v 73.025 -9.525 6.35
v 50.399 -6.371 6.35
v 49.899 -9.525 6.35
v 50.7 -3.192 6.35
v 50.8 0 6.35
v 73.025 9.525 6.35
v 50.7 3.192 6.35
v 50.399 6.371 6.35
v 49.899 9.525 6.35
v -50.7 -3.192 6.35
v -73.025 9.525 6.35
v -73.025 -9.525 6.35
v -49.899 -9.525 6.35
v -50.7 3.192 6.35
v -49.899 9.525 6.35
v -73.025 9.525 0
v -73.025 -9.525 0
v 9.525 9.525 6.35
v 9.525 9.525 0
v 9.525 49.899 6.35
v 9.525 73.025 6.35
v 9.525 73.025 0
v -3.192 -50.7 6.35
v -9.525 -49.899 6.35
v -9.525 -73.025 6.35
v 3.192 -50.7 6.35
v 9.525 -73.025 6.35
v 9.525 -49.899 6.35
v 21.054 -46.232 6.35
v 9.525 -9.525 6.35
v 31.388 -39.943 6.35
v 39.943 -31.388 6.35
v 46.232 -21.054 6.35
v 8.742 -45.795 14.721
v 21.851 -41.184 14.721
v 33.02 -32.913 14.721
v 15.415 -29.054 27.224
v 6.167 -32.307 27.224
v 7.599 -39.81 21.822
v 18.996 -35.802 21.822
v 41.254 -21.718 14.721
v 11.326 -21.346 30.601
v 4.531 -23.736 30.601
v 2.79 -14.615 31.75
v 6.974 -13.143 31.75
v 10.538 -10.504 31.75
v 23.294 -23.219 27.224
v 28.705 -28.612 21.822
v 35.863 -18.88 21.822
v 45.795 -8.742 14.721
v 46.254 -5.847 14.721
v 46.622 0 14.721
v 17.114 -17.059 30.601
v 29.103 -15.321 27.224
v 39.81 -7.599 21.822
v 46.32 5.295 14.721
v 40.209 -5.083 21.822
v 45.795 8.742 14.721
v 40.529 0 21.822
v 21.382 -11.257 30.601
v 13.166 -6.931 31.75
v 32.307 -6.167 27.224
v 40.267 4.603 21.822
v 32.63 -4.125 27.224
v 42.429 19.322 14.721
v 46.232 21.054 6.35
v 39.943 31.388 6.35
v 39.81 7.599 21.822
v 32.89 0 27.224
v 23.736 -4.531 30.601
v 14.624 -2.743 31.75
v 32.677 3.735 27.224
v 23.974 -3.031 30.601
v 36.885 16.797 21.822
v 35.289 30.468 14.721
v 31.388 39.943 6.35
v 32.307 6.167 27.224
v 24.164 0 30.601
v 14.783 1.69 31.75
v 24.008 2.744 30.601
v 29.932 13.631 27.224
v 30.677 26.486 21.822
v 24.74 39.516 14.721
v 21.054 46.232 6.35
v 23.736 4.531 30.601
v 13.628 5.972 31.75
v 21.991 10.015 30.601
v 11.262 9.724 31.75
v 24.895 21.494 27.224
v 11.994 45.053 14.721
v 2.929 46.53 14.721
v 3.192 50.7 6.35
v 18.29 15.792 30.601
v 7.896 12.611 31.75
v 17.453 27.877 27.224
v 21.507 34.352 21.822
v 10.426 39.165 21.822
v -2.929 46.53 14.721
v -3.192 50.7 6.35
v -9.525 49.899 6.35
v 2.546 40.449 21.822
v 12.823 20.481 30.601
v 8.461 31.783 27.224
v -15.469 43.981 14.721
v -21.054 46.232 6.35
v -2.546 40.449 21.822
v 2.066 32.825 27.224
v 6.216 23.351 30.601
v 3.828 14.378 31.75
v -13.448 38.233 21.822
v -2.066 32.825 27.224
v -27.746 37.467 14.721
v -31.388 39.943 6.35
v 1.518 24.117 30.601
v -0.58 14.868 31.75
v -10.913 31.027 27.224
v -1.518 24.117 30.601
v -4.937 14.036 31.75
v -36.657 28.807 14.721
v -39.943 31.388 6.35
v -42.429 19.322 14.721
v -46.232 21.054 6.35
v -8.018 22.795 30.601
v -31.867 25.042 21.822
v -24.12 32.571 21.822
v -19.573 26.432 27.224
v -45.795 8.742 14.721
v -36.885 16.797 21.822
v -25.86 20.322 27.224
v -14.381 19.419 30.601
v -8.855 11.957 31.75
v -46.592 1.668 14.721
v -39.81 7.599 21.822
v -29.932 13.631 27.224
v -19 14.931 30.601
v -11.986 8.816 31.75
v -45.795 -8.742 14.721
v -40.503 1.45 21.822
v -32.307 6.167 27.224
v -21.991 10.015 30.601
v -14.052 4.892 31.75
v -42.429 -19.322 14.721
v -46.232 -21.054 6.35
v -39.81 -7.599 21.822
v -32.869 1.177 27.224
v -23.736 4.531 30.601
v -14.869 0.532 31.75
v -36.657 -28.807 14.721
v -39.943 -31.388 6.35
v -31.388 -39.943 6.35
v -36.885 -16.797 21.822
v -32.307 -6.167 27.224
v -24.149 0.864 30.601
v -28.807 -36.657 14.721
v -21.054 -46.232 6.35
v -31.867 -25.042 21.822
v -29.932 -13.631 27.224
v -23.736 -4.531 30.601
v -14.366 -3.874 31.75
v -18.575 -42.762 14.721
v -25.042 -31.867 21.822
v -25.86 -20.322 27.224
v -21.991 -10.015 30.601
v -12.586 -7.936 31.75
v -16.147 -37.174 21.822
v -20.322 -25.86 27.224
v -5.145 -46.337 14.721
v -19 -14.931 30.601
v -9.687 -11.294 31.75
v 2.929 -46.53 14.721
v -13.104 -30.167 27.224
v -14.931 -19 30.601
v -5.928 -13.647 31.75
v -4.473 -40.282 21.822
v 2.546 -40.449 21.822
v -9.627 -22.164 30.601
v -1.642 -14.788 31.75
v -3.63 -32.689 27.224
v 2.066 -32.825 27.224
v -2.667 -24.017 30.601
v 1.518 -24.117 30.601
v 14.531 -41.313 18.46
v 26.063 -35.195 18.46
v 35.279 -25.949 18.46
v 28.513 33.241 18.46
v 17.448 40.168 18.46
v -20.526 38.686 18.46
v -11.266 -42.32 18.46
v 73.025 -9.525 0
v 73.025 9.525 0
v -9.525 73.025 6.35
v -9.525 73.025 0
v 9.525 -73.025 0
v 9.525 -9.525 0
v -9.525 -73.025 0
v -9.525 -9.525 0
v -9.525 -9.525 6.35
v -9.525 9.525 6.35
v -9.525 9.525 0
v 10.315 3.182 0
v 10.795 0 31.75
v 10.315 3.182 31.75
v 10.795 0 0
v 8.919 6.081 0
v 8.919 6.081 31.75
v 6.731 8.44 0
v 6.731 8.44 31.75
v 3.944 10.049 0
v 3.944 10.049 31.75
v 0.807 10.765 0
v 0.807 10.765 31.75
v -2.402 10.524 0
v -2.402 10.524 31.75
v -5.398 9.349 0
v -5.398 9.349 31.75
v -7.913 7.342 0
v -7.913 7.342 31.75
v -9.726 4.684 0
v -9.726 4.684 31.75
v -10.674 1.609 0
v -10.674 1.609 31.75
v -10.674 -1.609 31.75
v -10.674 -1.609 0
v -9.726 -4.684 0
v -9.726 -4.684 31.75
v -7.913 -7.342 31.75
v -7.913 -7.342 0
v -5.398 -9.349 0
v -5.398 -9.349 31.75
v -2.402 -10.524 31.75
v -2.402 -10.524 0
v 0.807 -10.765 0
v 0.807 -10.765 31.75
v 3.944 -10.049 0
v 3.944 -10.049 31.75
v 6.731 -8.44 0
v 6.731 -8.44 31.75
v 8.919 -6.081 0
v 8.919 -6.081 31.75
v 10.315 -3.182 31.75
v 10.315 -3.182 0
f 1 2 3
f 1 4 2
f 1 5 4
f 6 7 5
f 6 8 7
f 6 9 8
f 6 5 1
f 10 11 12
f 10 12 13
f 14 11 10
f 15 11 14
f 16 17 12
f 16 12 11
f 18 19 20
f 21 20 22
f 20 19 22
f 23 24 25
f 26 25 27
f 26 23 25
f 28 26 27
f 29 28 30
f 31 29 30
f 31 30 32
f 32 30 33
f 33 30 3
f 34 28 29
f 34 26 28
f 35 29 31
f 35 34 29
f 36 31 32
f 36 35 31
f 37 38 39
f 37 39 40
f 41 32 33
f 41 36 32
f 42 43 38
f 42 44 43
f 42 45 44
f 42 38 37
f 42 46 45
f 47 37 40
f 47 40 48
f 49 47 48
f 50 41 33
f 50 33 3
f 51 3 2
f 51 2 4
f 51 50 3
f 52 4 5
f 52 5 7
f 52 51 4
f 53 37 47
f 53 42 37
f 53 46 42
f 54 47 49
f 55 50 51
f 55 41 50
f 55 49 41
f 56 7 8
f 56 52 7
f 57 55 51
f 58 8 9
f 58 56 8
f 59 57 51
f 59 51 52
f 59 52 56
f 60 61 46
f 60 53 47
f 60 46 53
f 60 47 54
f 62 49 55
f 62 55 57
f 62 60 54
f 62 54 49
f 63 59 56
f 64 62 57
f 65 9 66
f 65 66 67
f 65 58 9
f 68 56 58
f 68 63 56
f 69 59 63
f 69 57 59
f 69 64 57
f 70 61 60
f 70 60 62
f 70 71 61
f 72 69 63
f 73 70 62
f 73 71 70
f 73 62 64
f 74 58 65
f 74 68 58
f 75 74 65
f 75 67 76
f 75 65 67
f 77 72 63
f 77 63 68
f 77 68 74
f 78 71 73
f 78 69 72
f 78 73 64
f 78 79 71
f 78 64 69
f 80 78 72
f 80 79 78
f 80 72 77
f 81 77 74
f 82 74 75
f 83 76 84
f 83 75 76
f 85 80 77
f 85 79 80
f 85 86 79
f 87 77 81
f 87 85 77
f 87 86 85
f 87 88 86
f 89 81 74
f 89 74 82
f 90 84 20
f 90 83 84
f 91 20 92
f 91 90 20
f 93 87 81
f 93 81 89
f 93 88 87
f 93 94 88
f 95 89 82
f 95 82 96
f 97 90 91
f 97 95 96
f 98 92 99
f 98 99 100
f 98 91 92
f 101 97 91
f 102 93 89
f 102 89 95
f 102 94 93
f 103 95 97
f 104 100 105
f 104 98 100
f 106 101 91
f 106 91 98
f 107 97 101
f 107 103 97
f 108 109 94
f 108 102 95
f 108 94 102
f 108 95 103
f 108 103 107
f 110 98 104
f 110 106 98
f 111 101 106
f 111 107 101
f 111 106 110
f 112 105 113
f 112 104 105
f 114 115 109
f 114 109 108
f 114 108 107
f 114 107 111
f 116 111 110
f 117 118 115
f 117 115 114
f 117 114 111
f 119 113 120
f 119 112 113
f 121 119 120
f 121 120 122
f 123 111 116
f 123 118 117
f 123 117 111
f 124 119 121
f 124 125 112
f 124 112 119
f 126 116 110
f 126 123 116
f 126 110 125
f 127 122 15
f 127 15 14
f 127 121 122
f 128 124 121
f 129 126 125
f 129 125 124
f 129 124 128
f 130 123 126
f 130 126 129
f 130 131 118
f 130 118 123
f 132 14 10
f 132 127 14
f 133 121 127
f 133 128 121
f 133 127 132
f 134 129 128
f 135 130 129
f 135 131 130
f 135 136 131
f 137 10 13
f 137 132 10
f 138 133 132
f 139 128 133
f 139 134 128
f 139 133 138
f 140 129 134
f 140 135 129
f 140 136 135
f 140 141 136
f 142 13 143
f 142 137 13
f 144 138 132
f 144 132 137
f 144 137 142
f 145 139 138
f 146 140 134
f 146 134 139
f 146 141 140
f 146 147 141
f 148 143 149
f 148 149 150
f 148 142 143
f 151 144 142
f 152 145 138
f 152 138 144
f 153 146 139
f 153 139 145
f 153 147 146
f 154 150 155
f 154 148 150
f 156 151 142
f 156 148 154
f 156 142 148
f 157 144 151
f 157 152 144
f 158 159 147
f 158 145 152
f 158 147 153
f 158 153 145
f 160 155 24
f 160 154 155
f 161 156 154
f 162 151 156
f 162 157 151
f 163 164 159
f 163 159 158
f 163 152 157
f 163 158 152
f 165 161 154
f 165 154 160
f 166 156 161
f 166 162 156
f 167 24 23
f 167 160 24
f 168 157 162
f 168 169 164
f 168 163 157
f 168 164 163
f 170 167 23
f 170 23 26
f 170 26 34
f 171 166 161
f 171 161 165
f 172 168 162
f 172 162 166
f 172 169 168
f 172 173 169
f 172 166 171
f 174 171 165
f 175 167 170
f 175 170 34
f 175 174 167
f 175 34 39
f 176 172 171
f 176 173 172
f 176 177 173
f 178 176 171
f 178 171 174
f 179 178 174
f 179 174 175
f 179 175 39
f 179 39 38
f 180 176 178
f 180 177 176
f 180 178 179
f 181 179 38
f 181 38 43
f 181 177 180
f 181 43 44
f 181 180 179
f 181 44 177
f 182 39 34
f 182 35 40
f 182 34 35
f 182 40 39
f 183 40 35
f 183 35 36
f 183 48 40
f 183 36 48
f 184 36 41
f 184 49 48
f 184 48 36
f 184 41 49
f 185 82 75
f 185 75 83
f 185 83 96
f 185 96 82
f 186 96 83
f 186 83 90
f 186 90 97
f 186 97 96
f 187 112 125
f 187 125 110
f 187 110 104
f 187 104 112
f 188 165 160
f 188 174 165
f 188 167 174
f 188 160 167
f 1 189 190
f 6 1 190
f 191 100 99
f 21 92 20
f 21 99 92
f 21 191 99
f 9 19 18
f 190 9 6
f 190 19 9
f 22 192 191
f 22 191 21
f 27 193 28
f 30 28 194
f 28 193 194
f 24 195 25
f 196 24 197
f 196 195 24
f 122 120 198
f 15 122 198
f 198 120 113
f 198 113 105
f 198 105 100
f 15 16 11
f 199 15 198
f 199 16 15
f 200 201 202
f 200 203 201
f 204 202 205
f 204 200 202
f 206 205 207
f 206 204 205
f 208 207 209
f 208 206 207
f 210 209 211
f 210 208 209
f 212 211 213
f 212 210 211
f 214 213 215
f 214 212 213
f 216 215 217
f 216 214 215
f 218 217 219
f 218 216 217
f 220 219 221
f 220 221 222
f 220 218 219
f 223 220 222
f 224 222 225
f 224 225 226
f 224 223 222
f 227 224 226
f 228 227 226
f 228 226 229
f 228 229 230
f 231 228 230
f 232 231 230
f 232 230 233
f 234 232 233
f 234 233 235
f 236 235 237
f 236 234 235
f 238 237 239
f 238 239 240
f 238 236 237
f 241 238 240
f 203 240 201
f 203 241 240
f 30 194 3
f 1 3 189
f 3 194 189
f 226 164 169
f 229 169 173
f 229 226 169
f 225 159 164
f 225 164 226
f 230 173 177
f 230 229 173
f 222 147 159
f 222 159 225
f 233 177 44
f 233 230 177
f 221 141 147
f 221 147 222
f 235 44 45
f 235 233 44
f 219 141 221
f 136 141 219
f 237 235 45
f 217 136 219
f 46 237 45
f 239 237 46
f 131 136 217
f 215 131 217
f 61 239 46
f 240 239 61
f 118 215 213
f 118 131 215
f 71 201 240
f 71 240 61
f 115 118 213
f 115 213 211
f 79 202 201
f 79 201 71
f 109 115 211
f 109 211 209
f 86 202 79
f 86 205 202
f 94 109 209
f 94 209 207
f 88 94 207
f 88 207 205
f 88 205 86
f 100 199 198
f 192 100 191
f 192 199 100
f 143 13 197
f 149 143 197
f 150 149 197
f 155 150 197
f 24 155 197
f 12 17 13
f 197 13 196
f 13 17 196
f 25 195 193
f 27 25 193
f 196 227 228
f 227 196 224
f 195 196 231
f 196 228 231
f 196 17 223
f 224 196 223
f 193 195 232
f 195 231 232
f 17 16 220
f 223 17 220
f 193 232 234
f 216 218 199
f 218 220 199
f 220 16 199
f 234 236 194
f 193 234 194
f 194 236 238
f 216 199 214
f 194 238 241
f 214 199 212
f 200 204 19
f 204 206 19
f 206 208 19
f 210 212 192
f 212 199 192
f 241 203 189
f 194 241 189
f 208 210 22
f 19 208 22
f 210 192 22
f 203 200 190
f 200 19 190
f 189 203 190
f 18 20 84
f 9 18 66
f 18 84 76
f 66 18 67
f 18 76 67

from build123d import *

# Parameters (mm, degrees)
F0_W     = 19.05
F0_H     = 63.5
F0_W_2   = 63.5
F0_H_2   = 19.05
F1_DEPTH = 6.35
F2_R     = 10.795
F3_DEPTH = 25.4
F4_DEPTH = 6.35


# Not quite as in the source:
# - a fillet or chamfer that OpenCascade refuses, or shapes differently, is made with other operations: its cross-section is extruded or revolved along the edge and cut away or added


with BuildPart() as f1:
    # F0 (on Top) → F1 (new body)
    with BuildSketch(Plane.XY):
        with Locations((0, 41.275)):
            Rectangle(F0_W, F0_H)
        with Locations((-41.275, 0)):
            Rectangle(F0_W_2, F0_H_2)
        Rectangle(F0_W, F0_H_2)
        with Locations((41.275, 0)):
            Rectangle(F0_W_2, F0_H_2)
        with Locations((0, -41.275)):
            Rectangle(F0_W, F0_H)
    extrude(amount=F1_DEPTH)

    # F2 (on face) → F3 (join)
    with BuildSketch(Plane.XY.offset(6.35)):
        with BuildLine():
            ThreePointArc((49.8990418245, -9.525), (50.5742588907, -4.7837576923), (50.8, 0))
            ThreePointArc((50.8, 0), (50.5742588907, 4.7837576923), (49.8990418245, 9.525))
            Line((49.8990418245, 9.525), (9.525, 9.525))
            Line((9.525, 9.525), (9.525, 49.8990418245))
            ThreePointArc((9.525, 49.8990418245), (0, 50.8), (-9.525, 49.8990418245))
            Line((-9.525, 49.8990418245), (-9.525, 9.525))
            Line((-9.525, 9.525), (-49.8990418245, 9.525))
            ThreePointArc((-49.8990418245, 9.525), (-50.8, 0), (-49.8990418245, -9.525))
            Line((-49.8990418245, -9.525), (-9.525, -9.525))
            Line((-9.525, -9.525), (-9.525, -49.8990418245))
            ThreePointArc((-9.525, -49.8990418245), (0, -50.8), (9.525, -49.8990418245))
            Line((9.525, -49.8990418245), (9.525, -9.525))
            Line((9.525, -9.525), (49.8990418245, -9.525))
        make_face()
        Circle(F2_R, mode=Mode.SUBTRACT)
        with BuildLine():
            ThreePointArc((-49.8990418245, -9.525), (-35.9210244843, -35.9210244843), (-9.525, -49.8990418245))
            Line((-9.525, -49.8990418245), (-9.525, -9.525))
            Line((-9.525, -9.525), (-49.8990418245, -9.525))
        make_face()
        with BuildLine():
            Line((-9.525, 9.525), (-9.525, 49.8990418245))
            ThreePointArc((-9.525, 49.8990418245), (-35.9210244843, 35.9210244843), (-49.8990418245, 9.525))
            Line((-49.8990418245, 9.525), (-9.525, 9.525))
        make_face()
        with BuildLine():
            Line((9.525, 9.525), (49.8990418245, 9.525))
            ThreePointArc((49.8990418245, 9.525), (35.9210244843, 35.9210244843), (9.525, 49.8990418245))
            Line((9.525, 49.8990418245), (9.525, 9.525))
        make_face()
        with BuildLine():
            ThreePointArc((9.525, -49.8990418245), (35.9210244843, -35.9210244843), (49.8990418245, -9.525))
            Line((49.8990418245, -9.525), (9.525, -9.525))
            Line((9.525, -9.525), (9.525, -49.8990418245))
        make_face()
    extrude(amount=F3_DEPTH)

    # F4 (cut, through all): a face of the model
    f4_faces = [f1.faces().sort_by_distance(p)[0] for p in [
        (0, 0, 6.35),
    ]]
    extrude(f4_faces, amount=-F4_DEPTH, mode=Mode.SUBTRACT)

    # F5: fillet of radius 38.1 on 1 edges, made by hand

    # F5_s1 → F5_t2 (revolve, cut)
    with BuildSketch(Plane(origin=(0, 0, 0), x_dir=(0, 0, 1), z_dir=(-0.9822646028, -0.1875, 0))):
        with BuildLine():
            ThreePointArc((6.35, -50.8), (24.7585197333, -36.8760207718), (31.75, -14.8789755157))
            Line((31.75, -14.8789755157), (32.512, -14.8789755157))
            Line((32.512, -14.8789755157), (32.512, -50.8))
            Line((32.512, -50.8), (31.75, -51.562))
            ThreePointArc((31.75, -51.562), (19.05, -51.562), (6.604, -51.5184204897))
            Line((6.604, -51.5184204897), (6.35, -50.8))
        make_face()
    revolve(axis=Axis((0, 0, 31.75), (0, 0, 1)), mode=Mode.SUBTRACT)


solid = f1.part
